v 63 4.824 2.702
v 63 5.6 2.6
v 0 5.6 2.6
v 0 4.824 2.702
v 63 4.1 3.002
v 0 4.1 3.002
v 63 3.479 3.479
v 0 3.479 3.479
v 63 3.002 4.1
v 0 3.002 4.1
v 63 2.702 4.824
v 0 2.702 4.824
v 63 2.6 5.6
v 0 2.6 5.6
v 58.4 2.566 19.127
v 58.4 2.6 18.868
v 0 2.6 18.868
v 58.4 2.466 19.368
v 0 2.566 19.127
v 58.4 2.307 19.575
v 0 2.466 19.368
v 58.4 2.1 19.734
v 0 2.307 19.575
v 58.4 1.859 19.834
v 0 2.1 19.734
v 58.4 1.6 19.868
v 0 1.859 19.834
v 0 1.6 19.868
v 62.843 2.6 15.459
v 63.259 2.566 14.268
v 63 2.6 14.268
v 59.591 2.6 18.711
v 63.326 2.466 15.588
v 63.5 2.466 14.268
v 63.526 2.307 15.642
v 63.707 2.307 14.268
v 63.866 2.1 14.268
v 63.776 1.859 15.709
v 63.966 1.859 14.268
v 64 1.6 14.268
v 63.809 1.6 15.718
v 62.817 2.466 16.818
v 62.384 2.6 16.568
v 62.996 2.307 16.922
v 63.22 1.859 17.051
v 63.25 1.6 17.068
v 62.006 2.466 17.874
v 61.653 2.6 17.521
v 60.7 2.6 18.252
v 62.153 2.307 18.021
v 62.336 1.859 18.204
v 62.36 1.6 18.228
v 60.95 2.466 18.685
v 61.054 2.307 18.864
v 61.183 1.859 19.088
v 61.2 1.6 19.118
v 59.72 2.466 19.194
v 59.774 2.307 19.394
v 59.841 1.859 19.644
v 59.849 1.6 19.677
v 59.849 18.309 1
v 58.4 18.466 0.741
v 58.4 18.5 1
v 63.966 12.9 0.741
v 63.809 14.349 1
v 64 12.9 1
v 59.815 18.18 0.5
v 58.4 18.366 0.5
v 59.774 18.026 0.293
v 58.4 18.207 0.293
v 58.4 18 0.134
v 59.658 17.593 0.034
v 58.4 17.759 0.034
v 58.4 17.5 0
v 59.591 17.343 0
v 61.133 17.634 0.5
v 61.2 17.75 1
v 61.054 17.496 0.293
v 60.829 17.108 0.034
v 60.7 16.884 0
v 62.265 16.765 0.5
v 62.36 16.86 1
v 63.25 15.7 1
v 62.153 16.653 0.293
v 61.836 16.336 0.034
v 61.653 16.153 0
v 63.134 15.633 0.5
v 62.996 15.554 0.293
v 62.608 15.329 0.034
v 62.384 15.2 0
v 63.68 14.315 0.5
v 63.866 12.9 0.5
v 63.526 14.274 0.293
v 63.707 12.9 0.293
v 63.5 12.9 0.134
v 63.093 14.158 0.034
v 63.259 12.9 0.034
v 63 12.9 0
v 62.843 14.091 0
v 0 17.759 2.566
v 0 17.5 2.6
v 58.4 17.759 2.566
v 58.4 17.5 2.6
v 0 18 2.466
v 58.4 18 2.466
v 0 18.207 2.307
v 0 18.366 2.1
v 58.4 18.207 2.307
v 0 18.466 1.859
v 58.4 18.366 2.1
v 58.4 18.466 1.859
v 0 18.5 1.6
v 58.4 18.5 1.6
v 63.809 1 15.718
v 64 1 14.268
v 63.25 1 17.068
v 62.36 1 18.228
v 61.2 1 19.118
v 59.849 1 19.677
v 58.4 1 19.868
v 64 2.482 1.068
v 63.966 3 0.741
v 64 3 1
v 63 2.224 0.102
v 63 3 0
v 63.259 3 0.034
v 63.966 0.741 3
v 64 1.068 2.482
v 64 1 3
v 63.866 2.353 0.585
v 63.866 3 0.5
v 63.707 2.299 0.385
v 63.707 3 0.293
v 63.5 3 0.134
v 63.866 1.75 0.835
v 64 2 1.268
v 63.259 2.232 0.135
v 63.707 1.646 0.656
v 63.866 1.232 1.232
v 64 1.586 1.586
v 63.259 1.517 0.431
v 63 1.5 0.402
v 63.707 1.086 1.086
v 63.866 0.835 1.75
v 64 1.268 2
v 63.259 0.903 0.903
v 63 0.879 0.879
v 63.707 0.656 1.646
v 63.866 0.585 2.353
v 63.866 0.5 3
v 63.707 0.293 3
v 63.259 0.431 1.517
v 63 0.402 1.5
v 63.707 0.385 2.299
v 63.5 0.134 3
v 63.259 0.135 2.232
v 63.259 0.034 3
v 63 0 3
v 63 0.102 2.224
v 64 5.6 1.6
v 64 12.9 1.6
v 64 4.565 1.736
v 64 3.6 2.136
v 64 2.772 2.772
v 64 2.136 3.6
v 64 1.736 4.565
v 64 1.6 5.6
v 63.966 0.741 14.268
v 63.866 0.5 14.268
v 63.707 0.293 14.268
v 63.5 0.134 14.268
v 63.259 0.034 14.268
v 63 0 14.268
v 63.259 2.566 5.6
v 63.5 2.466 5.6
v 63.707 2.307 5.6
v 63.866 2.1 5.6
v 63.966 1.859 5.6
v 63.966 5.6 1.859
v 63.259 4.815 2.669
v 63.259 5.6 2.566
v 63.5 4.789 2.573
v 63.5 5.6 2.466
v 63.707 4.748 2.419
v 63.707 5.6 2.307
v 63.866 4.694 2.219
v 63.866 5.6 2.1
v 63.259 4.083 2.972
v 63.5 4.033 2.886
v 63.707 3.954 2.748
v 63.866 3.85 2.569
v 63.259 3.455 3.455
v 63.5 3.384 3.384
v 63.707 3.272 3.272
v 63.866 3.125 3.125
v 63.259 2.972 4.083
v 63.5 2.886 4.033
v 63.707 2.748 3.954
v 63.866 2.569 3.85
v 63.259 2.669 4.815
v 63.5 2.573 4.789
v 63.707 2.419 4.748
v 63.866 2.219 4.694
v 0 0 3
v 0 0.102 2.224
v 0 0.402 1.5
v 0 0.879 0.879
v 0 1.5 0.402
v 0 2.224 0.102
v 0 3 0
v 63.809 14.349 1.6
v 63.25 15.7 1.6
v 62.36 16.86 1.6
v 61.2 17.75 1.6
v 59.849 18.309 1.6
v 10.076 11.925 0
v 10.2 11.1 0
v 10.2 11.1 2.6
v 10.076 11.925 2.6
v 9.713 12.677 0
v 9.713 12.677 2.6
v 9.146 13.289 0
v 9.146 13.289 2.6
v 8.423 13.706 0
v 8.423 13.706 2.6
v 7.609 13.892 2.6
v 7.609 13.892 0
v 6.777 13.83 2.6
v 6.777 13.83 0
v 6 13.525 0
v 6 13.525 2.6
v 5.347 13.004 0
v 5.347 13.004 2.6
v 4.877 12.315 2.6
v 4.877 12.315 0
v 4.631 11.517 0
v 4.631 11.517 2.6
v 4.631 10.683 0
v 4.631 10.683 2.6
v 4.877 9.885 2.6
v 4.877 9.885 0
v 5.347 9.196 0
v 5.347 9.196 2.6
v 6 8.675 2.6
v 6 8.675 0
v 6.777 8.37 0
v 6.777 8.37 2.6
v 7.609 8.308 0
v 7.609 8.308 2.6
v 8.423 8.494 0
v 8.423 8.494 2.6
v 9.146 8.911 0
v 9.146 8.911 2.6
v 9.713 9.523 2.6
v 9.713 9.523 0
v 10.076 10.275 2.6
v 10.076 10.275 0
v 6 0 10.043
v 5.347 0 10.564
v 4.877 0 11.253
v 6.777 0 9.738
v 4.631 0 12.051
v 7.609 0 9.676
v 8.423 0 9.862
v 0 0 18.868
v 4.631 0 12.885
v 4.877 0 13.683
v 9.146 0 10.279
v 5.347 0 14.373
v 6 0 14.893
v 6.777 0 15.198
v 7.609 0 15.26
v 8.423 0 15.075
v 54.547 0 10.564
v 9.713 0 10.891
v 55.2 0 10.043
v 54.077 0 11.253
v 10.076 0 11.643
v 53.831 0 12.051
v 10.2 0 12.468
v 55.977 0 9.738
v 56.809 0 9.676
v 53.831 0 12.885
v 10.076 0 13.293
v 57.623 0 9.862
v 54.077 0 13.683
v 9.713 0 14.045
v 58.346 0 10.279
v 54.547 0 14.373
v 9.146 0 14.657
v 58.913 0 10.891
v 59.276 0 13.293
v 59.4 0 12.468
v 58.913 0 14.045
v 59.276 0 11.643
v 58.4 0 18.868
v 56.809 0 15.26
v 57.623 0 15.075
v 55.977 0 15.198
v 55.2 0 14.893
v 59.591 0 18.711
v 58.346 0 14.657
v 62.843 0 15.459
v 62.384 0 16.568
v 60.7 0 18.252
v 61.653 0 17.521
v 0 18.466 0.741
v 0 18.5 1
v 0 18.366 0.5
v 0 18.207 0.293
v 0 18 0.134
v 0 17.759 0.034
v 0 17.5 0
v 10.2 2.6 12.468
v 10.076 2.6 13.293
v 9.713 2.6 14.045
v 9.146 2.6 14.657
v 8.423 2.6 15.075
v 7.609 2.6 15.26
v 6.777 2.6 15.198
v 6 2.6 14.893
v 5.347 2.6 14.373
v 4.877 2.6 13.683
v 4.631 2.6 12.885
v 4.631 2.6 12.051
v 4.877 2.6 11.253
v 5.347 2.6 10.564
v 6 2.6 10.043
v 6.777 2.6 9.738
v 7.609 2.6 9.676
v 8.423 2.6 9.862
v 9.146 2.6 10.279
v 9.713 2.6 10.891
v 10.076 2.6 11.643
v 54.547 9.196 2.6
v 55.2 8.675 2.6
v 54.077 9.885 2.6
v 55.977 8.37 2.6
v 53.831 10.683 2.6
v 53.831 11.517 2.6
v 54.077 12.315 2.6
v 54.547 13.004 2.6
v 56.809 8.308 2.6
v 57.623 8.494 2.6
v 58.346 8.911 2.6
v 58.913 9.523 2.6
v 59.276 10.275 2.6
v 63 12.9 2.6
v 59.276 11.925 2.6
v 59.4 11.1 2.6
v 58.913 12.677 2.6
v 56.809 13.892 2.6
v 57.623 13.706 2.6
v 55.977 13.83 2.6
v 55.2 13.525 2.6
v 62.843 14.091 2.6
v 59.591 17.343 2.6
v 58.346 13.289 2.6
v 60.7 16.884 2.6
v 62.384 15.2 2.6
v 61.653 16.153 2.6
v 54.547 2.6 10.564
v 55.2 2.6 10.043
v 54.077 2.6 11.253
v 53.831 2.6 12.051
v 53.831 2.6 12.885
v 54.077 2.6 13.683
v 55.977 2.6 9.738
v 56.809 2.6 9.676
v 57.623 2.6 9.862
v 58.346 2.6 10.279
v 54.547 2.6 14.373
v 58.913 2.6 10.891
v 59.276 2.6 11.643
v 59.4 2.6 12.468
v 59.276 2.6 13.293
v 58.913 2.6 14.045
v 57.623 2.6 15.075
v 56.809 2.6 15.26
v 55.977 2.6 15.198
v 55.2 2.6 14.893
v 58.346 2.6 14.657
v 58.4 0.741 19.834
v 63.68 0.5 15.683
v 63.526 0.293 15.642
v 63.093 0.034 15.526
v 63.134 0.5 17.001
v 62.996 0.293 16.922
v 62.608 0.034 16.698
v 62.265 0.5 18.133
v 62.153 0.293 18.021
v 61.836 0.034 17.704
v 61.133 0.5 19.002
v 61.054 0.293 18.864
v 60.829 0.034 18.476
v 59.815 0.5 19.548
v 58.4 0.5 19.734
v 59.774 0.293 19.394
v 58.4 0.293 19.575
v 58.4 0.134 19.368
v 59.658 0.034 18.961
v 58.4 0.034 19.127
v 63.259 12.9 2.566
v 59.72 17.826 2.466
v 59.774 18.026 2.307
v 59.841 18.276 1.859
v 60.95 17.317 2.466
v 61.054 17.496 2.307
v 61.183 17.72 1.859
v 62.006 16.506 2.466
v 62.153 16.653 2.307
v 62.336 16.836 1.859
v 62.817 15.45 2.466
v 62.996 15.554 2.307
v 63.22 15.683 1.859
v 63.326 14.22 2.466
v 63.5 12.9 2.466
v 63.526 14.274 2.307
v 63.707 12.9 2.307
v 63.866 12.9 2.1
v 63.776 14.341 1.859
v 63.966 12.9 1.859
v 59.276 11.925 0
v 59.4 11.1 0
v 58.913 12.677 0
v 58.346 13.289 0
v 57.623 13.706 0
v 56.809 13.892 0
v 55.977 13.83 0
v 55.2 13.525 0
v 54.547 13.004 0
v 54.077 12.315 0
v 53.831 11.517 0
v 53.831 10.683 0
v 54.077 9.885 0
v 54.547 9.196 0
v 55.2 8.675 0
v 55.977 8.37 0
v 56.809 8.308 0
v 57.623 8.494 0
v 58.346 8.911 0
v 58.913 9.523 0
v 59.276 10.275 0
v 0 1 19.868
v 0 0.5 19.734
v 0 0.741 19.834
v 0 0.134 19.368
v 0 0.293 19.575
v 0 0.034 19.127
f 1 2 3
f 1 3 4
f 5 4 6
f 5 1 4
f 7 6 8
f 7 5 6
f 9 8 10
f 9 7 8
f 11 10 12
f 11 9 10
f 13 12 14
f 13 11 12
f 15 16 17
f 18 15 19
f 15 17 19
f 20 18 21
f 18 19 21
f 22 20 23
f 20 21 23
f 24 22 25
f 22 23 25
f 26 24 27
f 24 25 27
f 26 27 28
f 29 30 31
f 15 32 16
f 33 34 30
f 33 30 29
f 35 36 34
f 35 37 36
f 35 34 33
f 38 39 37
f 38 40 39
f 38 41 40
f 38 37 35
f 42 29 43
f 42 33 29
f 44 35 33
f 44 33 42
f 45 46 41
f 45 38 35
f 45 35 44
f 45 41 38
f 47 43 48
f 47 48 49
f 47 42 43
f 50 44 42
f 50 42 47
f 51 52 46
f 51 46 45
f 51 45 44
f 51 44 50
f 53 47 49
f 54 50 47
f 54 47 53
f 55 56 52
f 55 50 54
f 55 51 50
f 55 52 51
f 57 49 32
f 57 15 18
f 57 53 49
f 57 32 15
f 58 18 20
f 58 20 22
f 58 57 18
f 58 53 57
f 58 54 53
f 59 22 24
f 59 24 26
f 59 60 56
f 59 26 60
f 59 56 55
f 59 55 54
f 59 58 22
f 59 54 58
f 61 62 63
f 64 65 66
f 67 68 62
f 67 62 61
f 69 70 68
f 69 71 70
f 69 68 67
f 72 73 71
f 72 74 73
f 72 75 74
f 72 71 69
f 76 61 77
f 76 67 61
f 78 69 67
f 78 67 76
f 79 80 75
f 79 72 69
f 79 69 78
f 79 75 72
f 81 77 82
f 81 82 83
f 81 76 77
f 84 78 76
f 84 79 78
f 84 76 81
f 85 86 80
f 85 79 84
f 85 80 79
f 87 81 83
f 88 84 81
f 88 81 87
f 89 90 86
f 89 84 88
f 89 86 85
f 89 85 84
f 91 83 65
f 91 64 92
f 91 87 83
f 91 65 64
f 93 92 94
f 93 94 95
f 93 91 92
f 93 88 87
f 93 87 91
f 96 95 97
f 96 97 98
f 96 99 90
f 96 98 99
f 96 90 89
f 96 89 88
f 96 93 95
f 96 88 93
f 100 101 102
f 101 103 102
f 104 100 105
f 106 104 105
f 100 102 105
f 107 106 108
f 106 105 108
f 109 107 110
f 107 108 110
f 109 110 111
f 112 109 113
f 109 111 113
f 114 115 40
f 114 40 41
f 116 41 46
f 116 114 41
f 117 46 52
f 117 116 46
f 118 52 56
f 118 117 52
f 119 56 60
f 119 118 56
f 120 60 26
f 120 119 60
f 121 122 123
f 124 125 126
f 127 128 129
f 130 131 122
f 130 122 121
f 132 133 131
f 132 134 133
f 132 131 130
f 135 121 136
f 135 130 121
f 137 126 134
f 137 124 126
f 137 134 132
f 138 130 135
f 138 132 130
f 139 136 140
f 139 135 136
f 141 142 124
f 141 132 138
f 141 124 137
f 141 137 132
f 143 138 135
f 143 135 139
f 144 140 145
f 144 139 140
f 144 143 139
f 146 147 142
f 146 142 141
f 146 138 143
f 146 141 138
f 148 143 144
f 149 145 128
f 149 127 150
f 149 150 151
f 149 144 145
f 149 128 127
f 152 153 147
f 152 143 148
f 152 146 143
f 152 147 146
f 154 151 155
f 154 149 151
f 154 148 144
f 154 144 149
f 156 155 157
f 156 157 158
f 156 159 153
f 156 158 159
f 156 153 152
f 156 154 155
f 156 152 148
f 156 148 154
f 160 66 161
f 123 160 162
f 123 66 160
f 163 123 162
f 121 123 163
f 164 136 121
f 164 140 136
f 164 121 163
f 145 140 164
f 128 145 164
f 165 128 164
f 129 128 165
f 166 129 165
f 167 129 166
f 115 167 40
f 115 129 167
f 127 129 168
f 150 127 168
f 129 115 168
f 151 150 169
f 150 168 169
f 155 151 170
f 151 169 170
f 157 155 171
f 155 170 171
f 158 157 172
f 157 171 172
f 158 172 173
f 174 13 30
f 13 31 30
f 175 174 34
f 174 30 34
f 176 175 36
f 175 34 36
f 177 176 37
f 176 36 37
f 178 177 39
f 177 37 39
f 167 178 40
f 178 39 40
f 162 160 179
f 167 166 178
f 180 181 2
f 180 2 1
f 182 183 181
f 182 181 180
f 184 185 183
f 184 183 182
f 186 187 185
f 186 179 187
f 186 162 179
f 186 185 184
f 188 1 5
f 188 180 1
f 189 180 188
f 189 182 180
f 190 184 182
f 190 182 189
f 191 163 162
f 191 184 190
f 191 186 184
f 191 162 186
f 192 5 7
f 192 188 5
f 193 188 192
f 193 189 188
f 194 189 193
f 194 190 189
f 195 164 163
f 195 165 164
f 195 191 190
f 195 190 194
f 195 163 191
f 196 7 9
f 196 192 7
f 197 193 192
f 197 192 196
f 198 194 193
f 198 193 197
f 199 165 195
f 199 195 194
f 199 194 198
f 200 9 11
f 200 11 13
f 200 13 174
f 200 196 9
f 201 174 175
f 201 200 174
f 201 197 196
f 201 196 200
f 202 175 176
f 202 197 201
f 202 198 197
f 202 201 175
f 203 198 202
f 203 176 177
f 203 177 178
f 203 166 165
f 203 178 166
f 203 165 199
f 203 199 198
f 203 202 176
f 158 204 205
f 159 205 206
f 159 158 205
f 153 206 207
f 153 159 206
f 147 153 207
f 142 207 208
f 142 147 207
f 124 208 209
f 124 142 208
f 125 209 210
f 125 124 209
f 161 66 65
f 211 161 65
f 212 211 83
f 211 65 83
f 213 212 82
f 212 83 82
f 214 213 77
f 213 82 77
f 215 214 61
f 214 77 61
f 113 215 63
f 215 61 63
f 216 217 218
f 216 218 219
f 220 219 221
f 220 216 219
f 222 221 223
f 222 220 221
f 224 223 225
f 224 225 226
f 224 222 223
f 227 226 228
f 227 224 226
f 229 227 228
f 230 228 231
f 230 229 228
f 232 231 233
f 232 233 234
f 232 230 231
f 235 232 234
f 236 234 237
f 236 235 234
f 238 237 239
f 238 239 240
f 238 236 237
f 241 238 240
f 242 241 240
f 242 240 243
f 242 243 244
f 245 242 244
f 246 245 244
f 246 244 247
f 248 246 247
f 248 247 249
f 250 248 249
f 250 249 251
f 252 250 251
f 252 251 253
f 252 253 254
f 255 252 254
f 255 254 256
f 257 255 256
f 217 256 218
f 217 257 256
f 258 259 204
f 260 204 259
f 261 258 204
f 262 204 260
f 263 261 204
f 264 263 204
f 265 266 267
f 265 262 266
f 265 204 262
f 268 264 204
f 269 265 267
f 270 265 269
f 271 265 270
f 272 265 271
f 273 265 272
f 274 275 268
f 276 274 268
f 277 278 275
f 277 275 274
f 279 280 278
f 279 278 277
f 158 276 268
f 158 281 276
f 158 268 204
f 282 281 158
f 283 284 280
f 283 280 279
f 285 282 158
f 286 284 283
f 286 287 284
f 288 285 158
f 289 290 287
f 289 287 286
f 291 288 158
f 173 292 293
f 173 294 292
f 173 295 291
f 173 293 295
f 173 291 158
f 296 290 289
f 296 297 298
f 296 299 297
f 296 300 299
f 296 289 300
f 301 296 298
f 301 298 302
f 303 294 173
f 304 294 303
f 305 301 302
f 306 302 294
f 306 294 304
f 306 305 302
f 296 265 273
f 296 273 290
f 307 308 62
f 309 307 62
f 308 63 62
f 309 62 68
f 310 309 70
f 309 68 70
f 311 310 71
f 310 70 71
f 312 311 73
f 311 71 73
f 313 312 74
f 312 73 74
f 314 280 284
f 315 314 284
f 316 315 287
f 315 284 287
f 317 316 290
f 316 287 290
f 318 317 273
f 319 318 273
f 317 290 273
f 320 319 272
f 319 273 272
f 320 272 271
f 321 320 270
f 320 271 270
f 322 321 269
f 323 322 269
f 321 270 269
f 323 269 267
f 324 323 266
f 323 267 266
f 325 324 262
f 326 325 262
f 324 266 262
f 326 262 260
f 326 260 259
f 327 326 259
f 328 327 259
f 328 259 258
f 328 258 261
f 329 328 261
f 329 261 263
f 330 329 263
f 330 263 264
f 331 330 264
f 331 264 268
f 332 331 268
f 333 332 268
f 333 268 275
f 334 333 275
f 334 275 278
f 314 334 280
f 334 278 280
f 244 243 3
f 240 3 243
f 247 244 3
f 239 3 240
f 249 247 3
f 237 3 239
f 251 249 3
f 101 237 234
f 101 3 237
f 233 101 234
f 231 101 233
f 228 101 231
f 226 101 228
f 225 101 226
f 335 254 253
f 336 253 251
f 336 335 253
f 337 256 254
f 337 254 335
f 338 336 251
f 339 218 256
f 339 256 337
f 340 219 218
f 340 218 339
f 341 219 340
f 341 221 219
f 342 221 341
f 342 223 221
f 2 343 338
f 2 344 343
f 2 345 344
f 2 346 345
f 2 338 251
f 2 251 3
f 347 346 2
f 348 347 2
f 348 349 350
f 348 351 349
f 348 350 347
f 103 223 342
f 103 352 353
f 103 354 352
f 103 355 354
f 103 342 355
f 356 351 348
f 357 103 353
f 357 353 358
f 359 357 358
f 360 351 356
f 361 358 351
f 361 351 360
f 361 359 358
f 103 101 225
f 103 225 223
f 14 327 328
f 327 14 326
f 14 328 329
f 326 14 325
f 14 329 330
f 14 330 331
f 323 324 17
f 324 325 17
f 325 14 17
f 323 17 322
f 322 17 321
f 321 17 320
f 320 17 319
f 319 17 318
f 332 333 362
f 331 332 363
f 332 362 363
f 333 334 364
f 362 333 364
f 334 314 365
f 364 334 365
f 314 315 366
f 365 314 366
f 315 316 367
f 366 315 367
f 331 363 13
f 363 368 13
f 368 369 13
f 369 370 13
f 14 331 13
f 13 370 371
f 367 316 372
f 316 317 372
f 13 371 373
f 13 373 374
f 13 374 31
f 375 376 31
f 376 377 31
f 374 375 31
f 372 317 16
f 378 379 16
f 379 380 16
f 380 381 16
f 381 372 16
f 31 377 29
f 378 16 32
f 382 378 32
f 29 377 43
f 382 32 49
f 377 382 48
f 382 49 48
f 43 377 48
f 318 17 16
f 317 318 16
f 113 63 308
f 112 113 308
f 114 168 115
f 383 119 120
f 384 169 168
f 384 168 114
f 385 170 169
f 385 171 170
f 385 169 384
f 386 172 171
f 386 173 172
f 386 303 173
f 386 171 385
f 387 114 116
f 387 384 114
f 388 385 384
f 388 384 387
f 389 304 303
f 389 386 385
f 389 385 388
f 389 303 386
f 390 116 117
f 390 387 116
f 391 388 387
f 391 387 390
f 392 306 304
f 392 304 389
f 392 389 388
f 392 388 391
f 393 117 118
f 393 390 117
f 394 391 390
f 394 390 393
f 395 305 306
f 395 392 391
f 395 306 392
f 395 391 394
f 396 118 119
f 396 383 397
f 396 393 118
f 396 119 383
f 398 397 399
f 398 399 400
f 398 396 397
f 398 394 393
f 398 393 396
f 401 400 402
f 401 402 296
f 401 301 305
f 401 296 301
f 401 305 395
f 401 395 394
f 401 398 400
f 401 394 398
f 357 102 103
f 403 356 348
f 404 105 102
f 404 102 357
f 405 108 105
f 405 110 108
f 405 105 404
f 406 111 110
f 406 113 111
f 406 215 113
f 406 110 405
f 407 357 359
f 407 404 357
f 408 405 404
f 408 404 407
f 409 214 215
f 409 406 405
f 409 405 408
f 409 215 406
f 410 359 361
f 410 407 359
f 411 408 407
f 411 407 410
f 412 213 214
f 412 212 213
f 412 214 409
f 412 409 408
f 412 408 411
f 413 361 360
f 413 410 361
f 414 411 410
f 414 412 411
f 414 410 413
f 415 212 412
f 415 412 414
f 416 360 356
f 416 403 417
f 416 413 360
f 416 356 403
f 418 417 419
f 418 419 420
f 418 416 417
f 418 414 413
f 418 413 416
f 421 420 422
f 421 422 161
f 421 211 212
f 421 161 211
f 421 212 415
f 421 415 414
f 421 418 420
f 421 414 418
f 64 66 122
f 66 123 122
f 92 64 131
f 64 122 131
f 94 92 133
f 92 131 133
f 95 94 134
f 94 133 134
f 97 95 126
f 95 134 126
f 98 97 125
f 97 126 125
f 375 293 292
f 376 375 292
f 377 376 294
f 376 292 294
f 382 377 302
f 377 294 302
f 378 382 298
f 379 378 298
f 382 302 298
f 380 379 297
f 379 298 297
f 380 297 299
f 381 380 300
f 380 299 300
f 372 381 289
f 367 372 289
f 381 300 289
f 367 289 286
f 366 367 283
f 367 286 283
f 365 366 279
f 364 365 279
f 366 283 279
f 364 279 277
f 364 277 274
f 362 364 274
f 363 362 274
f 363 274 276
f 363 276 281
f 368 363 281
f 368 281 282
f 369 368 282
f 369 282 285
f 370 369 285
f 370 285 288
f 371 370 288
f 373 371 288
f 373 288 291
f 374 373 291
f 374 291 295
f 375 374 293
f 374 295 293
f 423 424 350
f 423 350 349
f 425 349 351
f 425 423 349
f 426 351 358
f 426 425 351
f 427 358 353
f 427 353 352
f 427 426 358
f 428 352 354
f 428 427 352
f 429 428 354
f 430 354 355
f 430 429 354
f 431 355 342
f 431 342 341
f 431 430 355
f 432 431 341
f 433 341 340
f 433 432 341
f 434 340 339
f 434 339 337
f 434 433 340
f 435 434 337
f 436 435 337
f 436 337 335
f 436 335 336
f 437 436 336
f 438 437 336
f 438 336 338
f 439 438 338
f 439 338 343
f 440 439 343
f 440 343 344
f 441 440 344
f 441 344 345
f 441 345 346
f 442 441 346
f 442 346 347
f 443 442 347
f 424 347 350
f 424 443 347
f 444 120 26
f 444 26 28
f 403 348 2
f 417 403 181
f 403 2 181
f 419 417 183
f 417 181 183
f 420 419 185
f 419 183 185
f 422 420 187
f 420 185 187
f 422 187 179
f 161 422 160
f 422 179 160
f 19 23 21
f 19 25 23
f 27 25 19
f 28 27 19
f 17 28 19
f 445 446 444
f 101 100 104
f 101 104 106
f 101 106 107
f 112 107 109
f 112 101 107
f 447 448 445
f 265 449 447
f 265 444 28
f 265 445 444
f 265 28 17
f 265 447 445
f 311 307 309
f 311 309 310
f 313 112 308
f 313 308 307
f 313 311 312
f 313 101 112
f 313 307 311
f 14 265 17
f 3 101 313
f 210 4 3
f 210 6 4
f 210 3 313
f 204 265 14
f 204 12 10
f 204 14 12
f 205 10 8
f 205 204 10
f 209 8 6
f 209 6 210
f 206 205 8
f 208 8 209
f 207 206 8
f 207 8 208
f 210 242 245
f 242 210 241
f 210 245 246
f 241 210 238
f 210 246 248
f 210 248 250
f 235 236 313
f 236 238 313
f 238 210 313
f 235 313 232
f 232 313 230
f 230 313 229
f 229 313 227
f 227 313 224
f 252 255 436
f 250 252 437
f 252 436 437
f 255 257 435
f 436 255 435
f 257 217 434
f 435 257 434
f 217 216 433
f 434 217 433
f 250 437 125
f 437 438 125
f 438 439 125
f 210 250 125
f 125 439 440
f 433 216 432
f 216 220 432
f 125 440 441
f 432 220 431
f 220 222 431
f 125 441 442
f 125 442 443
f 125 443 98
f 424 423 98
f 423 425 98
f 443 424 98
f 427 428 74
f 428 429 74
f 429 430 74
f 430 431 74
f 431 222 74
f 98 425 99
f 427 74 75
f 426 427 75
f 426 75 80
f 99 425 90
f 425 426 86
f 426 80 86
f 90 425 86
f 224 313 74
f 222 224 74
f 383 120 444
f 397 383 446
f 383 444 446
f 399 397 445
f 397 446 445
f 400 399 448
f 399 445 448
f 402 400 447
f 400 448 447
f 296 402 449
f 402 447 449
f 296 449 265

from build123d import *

# Parameters (mm, degrees)
F0_R     = 2.8
F1_DEPTH = 2.6
F2_R     = 2.8
F3_DEPTH = 2.6
F4_R     = 3
F5_R     = 1


with BuildPart() as f1:
    # F0 (on Top) → F1 (new body)
    with BuildSketch(Plane.XY):
        with BuildLine():
            Line((0, 18.5), (0, 0))
            Line((0, 0), (64, 0))
            Line((64, 0), (64, 12.9))
            ThreePointArc((64, 12.9), (62.3597979746, 16.8597979746), (58.4, 18.5))
            Line((58.4, 18.5), (0, 18.5))
        make_face()
        with Locations((7.4, 11.1)):
            Circle(F0_R, mode=Mode.SUBTRACT)
        with Locations((56.6, 11.1)):
            Circle(F0_R, mode=Mode.SUBTRACT)
    extrude(amount=F1_DEPTH)

    # F2 (on Front) → F3 (join)
    with BuildSketch(Plane.XZ):
        with BuildLine():
            Line((0, 19.8681156561), (0, 1.3681156561))
            Line((0, 1.3681156561), (64, 1.3681156561))
            Line((64, 1.3681156561), (64, 14.2681156561))
            ThreePointArc((64, 14.2681156561), (62.3597979746, 18.2279136307), (58.4, 19.8681156561))
            Line((58.4, 19.8681156561), (0, 19.8681156561))
        make_face()
        with Locations((7.4, 12.4681156561)):
            Circle(F2_R, mode=Mode.SUBTRACT)
        with Locations((56.6, 12.4681156561)):
            Circle(F2_R, mode=Mode.SUBTRACT)
    extrude(amount=-F3_DEPTH)

    # F4
    f4_edges = [f1.edges().sort_by_distance(p)[0] for p in [
        (32, 0, 0),
        (32, 2.6, 2.6),
    ]]
    fillet(f4_edges, radius=F4_R)

    # F5
    f5_edges = [f1.edges().sort_by_distance(p)[0] for p in [
        (29.2, 2.6, 19.868116),
        (29.2, 0, 19.868116),
        (29.2, 18.5, 2.6),
        (29.2, 18.5, 0),
        (64, 0, 8.634058),
        (64, 0.87868, 0.87868),
        (64, 7.95, 0),
        (64, 9.25, 2.6),
        (64, 2.6, 9.934058),
        (62.359798, 2.6, 18.227914),
        (62.359798, 0, 18.227914),
        (62.359798, 16.859798, 2.6),
        (62.359798, 16.859798, 0),
    ]]
    fillet(f5_edges, radius=F5_R)


solid = f1.part
